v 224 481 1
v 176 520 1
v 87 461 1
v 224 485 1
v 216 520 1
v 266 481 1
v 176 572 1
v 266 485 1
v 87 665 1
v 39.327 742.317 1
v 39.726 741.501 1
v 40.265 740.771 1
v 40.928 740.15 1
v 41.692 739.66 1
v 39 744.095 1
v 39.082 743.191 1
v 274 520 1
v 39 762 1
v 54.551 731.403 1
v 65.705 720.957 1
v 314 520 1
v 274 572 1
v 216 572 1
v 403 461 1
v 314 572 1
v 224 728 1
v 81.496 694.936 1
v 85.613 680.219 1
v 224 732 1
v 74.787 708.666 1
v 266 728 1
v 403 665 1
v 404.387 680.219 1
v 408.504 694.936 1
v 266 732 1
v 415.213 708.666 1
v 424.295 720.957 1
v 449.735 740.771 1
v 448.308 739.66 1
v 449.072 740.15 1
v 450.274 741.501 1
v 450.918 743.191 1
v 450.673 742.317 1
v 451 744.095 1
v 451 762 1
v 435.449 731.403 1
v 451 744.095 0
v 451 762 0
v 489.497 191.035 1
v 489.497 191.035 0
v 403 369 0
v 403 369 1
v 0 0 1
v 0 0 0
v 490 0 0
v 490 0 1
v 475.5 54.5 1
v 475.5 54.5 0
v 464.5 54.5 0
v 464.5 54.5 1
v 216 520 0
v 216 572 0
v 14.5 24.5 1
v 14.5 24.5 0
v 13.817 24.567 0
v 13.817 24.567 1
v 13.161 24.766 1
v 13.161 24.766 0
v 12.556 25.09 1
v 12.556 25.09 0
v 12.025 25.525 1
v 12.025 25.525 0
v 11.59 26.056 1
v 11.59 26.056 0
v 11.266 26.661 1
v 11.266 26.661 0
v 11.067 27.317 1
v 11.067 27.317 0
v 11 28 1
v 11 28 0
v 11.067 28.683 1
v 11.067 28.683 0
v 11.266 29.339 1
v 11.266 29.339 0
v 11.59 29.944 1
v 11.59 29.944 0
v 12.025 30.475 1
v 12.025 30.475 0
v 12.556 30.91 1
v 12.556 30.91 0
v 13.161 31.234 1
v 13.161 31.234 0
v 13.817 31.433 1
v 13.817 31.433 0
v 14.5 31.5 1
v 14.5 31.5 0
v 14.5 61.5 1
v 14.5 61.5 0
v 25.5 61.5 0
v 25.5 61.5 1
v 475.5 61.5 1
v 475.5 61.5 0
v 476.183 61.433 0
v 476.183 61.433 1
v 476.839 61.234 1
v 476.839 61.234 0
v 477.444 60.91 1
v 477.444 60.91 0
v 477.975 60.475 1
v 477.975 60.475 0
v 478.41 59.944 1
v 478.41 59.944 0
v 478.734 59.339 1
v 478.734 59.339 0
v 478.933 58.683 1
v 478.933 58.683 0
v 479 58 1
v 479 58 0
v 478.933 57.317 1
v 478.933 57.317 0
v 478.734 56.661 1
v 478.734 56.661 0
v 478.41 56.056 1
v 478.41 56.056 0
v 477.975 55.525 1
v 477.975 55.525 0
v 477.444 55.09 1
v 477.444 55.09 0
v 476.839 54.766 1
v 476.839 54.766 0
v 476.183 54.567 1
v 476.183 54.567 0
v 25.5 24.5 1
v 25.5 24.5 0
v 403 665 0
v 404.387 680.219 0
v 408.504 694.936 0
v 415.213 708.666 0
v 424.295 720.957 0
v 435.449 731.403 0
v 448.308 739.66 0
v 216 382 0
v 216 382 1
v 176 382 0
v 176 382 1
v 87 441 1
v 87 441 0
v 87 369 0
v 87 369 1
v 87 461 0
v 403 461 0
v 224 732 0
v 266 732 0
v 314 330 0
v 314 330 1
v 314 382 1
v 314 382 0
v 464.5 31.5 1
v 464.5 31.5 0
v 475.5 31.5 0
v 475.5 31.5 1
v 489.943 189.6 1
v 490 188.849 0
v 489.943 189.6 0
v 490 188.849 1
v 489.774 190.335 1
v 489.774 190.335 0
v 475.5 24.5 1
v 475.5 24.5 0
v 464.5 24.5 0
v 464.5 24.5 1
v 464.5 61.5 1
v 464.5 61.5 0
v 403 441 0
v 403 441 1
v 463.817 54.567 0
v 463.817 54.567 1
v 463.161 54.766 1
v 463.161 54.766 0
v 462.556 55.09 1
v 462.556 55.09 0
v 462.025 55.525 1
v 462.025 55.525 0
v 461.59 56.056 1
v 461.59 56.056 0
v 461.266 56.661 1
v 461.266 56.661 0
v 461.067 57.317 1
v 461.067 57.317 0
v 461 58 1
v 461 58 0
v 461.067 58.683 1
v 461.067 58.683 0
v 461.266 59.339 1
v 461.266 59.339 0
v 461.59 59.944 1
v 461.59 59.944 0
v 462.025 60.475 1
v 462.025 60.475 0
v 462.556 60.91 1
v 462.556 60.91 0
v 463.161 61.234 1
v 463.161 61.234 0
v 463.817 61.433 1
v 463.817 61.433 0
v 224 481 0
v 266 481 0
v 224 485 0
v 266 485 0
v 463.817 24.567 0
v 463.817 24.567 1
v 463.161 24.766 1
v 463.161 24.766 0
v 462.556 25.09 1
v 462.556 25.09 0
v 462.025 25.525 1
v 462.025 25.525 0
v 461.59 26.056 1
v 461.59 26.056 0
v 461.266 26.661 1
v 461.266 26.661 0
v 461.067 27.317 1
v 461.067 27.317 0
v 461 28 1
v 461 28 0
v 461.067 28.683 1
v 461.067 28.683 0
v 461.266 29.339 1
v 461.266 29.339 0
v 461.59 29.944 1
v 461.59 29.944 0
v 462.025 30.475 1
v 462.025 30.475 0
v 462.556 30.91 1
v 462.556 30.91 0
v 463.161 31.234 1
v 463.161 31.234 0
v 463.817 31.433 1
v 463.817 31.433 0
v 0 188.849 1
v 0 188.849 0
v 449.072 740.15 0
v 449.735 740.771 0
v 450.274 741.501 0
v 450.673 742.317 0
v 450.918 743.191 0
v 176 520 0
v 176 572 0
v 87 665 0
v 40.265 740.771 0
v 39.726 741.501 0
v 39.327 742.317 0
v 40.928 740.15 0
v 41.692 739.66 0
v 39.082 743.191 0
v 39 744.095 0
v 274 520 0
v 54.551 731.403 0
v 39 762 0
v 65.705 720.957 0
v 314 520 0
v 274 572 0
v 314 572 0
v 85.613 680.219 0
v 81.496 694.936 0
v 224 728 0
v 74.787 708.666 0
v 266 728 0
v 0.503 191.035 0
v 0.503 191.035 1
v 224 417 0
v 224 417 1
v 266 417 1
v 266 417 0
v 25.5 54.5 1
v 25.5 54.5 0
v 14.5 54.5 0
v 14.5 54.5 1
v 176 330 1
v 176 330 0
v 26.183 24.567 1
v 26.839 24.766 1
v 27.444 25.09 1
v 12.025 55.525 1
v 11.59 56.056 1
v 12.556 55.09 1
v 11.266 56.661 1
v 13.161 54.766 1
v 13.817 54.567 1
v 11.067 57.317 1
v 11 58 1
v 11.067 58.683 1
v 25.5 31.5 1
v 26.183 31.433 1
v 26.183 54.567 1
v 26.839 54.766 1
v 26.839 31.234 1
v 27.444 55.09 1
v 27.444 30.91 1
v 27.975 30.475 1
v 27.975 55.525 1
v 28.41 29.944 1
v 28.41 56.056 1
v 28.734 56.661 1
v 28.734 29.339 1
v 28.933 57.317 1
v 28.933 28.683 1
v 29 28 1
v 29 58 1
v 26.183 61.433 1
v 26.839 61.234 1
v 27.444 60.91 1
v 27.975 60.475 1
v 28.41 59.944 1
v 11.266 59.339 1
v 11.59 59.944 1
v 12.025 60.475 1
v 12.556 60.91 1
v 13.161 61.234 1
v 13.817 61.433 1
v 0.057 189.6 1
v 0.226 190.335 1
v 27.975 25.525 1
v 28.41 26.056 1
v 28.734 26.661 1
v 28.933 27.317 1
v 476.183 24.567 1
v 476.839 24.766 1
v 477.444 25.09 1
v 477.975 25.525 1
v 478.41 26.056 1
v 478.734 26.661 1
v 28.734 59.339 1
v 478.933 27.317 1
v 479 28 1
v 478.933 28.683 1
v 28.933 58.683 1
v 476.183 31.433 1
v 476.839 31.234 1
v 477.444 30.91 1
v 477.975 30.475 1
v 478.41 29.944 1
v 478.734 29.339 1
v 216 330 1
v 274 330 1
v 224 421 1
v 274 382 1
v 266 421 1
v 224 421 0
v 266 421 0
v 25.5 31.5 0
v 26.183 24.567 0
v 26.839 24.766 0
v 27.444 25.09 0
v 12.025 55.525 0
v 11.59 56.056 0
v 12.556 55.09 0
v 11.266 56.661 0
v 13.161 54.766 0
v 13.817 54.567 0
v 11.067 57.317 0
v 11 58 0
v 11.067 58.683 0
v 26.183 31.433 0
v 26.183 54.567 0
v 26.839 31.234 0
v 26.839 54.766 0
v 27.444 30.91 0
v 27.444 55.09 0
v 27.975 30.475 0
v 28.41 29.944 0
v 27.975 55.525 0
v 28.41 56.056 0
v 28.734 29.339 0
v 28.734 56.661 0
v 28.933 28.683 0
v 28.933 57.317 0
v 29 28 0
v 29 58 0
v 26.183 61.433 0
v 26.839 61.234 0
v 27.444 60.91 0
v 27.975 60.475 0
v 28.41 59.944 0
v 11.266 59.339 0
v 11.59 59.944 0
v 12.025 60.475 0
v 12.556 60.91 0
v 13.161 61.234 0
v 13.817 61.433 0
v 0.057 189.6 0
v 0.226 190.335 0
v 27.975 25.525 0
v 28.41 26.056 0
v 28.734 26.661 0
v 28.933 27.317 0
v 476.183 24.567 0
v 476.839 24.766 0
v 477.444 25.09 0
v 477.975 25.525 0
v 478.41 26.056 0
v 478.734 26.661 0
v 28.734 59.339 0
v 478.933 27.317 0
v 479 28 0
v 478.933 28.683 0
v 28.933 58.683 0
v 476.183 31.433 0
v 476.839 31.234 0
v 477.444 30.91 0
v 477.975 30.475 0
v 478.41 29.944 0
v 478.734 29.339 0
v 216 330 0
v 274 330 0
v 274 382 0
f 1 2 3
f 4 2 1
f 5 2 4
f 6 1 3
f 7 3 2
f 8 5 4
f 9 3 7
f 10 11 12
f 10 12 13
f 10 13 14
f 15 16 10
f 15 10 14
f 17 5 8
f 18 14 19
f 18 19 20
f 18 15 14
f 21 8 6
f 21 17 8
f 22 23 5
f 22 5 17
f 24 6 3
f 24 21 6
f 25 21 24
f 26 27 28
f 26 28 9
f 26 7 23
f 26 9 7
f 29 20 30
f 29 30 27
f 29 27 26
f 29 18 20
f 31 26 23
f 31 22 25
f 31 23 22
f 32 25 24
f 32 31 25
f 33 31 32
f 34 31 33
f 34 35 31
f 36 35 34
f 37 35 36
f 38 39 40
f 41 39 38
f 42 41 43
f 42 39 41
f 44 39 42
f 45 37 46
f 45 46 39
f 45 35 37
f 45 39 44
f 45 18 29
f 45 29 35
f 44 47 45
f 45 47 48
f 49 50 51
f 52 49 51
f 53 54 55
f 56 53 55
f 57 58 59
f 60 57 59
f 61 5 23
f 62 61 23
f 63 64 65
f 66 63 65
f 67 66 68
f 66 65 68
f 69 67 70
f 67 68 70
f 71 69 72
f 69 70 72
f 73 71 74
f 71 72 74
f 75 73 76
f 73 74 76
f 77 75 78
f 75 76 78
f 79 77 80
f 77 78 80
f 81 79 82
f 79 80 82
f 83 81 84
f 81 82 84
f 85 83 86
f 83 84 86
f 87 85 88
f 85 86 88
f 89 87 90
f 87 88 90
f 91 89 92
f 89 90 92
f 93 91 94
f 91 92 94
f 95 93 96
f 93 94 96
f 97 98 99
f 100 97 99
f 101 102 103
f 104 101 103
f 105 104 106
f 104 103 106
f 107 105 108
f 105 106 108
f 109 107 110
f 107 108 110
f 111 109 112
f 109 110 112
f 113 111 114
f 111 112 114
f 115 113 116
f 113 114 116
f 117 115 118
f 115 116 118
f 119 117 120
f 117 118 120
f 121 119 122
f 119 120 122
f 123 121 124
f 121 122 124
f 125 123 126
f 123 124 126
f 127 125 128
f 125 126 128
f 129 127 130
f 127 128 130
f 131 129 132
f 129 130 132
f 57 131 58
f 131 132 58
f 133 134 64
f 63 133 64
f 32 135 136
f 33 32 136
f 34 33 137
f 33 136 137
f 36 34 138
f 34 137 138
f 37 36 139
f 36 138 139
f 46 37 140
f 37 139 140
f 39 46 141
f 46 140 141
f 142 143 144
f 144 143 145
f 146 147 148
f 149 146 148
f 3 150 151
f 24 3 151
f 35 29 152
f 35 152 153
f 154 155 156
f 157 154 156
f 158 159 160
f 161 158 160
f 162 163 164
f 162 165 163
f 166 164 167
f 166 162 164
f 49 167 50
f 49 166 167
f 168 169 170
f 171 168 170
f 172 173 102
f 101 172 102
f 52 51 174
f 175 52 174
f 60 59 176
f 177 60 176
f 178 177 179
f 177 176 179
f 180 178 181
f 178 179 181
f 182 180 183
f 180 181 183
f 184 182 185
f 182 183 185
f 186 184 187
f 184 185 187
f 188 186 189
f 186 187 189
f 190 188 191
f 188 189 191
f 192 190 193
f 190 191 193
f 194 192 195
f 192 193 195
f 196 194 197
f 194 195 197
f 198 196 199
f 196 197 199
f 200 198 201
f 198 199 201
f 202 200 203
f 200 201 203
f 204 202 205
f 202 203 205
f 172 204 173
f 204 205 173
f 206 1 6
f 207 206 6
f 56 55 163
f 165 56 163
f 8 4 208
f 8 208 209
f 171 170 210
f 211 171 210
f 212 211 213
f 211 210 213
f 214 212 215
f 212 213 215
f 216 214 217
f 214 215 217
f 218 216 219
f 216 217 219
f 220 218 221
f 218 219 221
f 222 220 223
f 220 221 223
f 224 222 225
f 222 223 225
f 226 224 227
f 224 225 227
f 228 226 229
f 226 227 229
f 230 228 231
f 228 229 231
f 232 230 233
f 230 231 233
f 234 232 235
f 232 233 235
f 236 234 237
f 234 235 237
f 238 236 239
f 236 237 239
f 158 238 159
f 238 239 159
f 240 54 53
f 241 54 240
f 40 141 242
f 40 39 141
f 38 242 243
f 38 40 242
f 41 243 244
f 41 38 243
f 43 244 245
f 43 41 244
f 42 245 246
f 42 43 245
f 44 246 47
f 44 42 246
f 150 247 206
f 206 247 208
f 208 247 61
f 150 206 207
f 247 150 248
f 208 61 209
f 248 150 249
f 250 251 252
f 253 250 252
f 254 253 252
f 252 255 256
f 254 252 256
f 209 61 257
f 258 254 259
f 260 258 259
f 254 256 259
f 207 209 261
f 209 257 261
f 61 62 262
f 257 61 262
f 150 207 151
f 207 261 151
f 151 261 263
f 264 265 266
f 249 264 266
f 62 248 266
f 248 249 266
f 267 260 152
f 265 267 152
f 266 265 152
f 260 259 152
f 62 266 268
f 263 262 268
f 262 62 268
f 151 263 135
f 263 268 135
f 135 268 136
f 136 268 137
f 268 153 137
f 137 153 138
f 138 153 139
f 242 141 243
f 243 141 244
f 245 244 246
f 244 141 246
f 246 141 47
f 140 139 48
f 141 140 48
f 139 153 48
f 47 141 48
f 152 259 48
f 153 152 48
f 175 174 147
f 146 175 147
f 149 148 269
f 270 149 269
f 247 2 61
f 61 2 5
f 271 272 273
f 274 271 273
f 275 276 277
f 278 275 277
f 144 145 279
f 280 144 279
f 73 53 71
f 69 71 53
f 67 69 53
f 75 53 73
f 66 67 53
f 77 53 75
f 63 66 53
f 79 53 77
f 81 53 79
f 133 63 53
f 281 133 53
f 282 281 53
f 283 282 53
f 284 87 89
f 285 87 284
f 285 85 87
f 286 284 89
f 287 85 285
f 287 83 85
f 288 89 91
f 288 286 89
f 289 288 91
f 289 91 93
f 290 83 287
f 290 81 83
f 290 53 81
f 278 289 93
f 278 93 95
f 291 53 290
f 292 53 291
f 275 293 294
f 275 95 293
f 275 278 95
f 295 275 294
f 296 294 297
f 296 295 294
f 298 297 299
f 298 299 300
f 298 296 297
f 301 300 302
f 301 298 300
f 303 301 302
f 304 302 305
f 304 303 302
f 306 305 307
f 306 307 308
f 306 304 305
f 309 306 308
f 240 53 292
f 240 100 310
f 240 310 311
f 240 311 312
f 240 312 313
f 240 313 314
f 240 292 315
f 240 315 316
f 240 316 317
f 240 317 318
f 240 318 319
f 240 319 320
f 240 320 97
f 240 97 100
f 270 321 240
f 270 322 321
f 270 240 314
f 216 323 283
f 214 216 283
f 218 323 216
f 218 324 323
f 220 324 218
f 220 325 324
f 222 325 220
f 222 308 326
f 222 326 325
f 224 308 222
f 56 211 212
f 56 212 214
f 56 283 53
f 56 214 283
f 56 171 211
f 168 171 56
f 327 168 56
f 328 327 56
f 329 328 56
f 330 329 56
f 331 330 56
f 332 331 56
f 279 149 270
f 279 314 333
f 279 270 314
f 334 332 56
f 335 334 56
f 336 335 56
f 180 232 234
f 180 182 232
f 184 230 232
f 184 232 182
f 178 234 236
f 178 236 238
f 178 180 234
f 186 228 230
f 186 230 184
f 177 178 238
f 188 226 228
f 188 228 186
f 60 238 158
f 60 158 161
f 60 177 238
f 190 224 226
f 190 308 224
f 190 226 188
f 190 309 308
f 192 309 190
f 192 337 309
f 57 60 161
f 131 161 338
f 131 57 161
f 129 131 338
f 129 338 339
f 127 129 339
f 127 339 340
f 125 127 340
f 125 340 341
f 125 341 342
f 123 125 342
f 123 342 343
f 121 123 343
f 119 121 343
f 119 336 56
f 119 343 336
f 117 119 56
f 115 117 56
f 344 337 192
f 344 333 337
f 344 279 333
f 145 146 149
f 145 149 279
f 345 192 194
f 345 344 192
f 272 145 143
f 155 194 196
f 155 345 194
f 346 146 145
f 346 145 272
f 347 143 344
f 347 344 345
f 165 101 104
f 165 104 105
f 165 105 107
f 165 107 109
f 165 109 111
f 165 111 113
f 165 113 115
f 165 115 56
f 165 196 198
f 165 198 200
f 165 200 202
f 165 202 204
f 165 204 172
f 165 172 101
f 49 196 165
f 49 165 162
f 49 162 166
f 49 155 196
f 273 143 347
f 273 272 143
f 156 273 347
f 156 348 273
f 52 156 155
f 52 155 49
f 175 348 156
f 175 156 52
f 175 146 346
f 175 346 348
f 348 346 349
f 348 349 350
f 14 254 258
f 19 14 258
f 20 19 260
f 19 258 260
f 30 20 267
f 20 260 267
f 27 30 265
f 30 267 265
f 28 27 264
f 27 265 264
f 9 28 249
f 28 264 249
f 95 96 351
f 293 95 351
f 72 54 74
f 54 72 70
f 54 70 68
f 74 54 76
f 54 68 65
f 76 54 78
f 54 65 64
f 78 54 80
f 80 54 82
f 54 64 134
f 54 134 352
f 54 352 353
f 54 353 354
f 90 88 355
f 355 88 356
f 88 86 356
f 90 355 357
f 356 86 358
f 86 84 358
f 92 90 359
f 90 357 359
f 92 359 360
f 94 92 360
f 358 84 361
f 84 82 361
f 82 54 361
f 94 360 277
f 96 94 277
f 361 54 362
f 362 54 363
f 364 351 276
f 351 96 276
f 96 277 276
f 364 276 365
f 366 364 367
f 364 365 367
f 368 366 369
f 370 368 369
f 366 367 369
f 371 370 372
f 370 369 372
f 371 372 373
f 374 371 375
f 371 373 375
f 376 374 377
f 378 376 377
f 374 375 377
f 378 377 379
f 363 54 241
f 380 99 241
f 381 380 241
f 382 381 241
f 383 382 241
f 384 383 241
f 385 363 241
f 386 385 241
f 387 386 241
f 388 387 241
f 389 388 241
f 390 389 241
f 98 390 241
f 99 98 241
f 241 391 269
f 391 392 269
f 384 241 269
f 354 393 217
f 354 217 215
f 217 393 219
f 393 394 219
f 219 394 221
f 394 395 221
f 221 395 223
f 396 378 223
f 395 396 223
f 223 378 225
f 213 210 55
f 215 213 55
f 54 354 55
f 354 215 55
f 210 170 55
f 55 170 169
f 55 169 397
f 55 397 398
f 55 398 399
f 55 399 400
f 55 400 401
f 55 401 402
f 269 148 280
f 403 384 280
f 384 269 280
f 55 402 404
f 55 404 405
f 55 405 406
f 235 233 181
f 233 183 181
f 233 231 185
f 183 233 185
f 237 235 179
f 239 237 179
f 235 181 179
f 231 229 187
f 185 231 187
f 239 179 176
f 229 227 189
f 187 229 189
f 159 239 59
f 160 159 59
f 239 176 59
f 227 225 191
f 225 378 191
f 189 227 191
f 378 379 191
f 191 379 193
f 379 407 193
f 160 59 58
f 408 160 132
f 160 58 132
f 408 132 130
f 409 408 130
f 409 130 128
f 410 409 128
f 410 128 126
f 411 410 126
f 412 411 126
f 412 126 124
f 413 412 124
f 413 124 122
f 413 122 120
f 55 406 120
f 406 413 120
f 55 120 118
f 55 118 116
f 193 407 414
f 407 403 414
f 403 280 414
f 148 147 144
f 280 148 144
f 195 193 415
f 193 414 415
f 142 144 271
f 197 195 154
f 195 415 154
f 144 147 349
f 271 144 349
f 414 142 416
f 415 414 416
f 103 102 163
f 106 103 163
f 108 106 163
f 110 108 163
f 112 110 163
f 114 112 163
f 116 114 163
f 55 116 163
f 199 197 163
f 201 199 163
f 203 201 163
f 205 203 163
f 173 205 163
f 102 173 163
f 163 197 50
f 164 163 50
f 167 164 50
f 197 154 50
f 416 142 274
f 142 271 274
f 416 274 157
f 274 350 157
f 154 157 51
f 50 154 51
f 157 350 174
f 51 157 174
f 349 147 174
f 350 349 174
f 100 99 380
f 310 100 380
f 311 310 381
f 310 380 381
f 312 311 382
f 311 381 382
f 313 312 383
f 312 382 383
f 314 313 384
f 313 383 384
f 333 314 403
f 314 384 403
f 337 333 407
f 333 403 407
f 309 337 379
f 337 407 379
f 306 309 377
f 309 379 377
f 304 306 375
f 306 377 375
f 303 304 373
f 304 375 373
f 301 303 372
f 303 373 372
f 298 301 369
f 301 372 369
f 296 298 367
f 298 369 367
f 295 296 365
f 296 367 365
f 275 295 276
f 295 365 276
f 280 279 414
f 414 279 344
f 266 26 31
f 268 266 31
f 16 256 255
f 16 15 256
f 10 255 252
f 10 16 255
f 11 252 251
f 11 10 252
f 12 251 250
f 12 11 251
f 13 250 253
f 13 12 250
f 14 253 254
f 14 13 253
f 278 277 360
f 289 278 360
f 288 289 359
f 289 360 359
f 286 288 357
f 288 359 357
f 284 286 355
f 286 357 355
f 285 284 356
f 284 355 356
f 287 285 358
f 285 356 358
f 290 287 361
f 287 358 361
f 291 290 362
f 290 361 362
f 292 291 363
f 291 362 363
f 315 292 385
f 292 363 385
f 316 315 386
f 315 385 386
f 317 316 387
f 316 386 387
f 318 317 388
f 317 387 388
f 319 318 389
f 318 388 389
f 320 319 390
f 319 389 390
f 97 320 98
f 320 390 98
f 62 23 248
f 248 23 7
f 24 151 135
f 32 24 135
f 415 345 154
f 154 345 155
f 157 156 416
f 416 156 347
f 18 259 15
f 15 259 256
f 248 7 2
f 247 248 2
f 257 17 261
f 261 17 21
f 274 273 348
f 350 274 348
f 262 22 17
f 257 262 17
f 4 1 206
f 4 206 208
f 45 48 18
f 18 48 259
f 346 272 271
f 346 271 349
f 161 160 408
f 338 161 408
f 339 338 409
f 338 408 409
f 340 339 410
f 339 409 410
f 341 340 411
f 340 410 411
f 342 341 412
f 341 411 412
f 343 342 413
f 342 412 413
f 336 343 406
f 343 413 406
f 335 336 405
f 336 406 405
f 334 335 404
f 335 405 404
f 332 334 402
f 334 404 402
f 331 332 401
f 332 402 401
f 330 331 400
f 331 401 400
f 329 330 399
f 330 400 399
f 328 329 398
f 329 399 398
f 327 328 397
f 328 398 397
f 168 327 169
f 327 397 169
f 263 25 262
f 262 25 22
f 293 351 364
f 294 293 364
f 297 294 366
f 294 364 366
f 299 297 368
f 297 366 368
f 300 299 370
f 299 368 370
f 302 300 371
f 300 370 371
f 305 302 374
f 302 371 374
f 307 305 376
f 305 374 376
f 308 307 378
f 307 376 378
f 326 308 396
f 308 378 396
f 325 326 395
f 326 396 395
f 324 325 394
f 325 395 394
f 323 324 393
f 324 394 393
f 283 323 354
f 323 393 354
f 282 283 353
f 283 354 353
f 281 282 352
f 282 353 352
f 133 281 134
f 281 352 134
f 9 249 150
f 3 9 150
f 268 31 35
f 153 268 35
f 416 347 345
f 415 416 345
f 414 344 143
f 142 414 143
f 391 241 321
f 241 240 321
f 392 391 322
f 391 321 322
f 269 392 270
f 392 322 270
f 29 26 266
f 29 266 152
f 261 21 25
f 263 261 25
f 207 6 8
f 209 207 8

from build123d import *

# Parameters (mm, degrees)
F0_W     = 490
F0_H     = 190
F1_DEPTH = 1
F2_R     = 5
F3_W     = 42
F3_H     = 4
F4_DEPTH = 25
F5_W     = 42
F5_H     = 4
F6_DEPTH = 25


with BuildPart() as f1:
    # F0 (on Top) → F1 (new body)
    with BuildSketch(Plane.XY):
        with Locations((245, 95)):
            Rectangle(F0_W, F0_H)
        with BuildLine():
            Line((25.5, 24.5), (14.5, 24.5))
            ThreePointArc((14.5, 24.5), (11, 28), (14.5, 31.5))
            Line((14.5, 31.5), (25.5, 31.5))
            ThreePointArc((25.5, 31.5), (29, 28), (25.5, 24.5))
        make_face(mode=Mode.SUBTRACT)
        with BuildLine():
            Line((25.5, 54.5), (14.5, 54.5))
            ThreePointArc((14.5, 54.5), (11, 58), (14.5, 61.5))
            Line((14.5, 61.5), (25.5, 61.5))
            ThreePointArc((25.5, 61.5), (29, 58), (25.5, 54.5))
        make_face(mode=Mode.SUBTRACT)
        with BuildLine():
            Line((475.5, 24.5), (464.5, 24.5))
            ThreePointArc((464.5, 24.5), (461, 28), (464.5, 31.5))
            Line((464.5, 31.5), (475.5, 31.5))
            ThreePointArc((475.5, 31.5), (479, 28), (475.5, 24.5))
        make_face(mode=Mode.SUBTRACT)
        with BuildLine():
            Line((475.5, 54.5), (464.5, 54.5))
            ThreePointArc((464.5, 54.5), (461, 58), (464.5, 61.5))
            Line((464.5, 61.5), (475.5, 61.5))
            ThreePointArc((475.5, 61.5), (479, 58), (475.5, 54.5))
        make_face(mode=Mode.SUBTRACT)
        Polygon((87, 369), (0, 190), (490, 190), (403, 369), (403, 441), (87, 441), align=None)
        with BuildLine():
            Line((87, 665), (87, 461))
            Line((87, 461), (403, 461))
            Line((403, 461), (403, 665))
            ThreePointArc((403, 665), (416.004684, 709.94441), (451, 741))
            Line((451, 741), (451, 762))
            Line((451, 762), (39, 762))
            Line((39, 762), (39, 741))
            ThreePointArc((39, 741), (73.995316, 709.94441), (87, 665))
        make_face()
    extrude(amount=F1_DEPTH)

    # F2
    f2_edges = [f1.edges().sort_by_distance(p)[0] for p in [
        (39, 741, 0.5),
        (451, 741, 0.5),
        (0, 190, 0.5),
        (490, 190, 0.5),
    ]]
    fillet(f2_edges, radius=F2_R)

    # F3 (on face) → F4 (cut)
    with BuildSketch(Plane.XY.offset(1)):
        Polygon((176, 330), (211, 330), (216, 330), (216, 377), (216, 382), (176, 382), (176, 377), align=None)
        with Locations((245, 419)):
            Rectangle(F3_W, F3_H)
        Polygon((279, 330), (314, 330), (314, 377), (314, 382), (274, 382), (274, 377), (274, 330), align=None)
    extrude(amount=-F4_DEPTH, mode=Mode.SUBTRACT)

    # F5 (on face) → F6 (cut)
    with BuildSketch(Plane.XY.offset(1)):
        with Locations((245, 483)):
            Rectangle(F5_W, F5_H)
        Polygon((216, 572), (211, 572), (176, 572), (176, 525), (176, 520), (216, 520), (216, 525), align=None)
        Polygon((314, 572), (279, 572), (274, 572), (274, 525), (274, 520), (314, 520), (314, 525), align=None)
        with Locations((245, 730)):
            Rectangle(F5_W, F5_H)
    extrude(amount=-F6_DEPTH, mode=Mode.SUBTRACT)


solid = f1.part
